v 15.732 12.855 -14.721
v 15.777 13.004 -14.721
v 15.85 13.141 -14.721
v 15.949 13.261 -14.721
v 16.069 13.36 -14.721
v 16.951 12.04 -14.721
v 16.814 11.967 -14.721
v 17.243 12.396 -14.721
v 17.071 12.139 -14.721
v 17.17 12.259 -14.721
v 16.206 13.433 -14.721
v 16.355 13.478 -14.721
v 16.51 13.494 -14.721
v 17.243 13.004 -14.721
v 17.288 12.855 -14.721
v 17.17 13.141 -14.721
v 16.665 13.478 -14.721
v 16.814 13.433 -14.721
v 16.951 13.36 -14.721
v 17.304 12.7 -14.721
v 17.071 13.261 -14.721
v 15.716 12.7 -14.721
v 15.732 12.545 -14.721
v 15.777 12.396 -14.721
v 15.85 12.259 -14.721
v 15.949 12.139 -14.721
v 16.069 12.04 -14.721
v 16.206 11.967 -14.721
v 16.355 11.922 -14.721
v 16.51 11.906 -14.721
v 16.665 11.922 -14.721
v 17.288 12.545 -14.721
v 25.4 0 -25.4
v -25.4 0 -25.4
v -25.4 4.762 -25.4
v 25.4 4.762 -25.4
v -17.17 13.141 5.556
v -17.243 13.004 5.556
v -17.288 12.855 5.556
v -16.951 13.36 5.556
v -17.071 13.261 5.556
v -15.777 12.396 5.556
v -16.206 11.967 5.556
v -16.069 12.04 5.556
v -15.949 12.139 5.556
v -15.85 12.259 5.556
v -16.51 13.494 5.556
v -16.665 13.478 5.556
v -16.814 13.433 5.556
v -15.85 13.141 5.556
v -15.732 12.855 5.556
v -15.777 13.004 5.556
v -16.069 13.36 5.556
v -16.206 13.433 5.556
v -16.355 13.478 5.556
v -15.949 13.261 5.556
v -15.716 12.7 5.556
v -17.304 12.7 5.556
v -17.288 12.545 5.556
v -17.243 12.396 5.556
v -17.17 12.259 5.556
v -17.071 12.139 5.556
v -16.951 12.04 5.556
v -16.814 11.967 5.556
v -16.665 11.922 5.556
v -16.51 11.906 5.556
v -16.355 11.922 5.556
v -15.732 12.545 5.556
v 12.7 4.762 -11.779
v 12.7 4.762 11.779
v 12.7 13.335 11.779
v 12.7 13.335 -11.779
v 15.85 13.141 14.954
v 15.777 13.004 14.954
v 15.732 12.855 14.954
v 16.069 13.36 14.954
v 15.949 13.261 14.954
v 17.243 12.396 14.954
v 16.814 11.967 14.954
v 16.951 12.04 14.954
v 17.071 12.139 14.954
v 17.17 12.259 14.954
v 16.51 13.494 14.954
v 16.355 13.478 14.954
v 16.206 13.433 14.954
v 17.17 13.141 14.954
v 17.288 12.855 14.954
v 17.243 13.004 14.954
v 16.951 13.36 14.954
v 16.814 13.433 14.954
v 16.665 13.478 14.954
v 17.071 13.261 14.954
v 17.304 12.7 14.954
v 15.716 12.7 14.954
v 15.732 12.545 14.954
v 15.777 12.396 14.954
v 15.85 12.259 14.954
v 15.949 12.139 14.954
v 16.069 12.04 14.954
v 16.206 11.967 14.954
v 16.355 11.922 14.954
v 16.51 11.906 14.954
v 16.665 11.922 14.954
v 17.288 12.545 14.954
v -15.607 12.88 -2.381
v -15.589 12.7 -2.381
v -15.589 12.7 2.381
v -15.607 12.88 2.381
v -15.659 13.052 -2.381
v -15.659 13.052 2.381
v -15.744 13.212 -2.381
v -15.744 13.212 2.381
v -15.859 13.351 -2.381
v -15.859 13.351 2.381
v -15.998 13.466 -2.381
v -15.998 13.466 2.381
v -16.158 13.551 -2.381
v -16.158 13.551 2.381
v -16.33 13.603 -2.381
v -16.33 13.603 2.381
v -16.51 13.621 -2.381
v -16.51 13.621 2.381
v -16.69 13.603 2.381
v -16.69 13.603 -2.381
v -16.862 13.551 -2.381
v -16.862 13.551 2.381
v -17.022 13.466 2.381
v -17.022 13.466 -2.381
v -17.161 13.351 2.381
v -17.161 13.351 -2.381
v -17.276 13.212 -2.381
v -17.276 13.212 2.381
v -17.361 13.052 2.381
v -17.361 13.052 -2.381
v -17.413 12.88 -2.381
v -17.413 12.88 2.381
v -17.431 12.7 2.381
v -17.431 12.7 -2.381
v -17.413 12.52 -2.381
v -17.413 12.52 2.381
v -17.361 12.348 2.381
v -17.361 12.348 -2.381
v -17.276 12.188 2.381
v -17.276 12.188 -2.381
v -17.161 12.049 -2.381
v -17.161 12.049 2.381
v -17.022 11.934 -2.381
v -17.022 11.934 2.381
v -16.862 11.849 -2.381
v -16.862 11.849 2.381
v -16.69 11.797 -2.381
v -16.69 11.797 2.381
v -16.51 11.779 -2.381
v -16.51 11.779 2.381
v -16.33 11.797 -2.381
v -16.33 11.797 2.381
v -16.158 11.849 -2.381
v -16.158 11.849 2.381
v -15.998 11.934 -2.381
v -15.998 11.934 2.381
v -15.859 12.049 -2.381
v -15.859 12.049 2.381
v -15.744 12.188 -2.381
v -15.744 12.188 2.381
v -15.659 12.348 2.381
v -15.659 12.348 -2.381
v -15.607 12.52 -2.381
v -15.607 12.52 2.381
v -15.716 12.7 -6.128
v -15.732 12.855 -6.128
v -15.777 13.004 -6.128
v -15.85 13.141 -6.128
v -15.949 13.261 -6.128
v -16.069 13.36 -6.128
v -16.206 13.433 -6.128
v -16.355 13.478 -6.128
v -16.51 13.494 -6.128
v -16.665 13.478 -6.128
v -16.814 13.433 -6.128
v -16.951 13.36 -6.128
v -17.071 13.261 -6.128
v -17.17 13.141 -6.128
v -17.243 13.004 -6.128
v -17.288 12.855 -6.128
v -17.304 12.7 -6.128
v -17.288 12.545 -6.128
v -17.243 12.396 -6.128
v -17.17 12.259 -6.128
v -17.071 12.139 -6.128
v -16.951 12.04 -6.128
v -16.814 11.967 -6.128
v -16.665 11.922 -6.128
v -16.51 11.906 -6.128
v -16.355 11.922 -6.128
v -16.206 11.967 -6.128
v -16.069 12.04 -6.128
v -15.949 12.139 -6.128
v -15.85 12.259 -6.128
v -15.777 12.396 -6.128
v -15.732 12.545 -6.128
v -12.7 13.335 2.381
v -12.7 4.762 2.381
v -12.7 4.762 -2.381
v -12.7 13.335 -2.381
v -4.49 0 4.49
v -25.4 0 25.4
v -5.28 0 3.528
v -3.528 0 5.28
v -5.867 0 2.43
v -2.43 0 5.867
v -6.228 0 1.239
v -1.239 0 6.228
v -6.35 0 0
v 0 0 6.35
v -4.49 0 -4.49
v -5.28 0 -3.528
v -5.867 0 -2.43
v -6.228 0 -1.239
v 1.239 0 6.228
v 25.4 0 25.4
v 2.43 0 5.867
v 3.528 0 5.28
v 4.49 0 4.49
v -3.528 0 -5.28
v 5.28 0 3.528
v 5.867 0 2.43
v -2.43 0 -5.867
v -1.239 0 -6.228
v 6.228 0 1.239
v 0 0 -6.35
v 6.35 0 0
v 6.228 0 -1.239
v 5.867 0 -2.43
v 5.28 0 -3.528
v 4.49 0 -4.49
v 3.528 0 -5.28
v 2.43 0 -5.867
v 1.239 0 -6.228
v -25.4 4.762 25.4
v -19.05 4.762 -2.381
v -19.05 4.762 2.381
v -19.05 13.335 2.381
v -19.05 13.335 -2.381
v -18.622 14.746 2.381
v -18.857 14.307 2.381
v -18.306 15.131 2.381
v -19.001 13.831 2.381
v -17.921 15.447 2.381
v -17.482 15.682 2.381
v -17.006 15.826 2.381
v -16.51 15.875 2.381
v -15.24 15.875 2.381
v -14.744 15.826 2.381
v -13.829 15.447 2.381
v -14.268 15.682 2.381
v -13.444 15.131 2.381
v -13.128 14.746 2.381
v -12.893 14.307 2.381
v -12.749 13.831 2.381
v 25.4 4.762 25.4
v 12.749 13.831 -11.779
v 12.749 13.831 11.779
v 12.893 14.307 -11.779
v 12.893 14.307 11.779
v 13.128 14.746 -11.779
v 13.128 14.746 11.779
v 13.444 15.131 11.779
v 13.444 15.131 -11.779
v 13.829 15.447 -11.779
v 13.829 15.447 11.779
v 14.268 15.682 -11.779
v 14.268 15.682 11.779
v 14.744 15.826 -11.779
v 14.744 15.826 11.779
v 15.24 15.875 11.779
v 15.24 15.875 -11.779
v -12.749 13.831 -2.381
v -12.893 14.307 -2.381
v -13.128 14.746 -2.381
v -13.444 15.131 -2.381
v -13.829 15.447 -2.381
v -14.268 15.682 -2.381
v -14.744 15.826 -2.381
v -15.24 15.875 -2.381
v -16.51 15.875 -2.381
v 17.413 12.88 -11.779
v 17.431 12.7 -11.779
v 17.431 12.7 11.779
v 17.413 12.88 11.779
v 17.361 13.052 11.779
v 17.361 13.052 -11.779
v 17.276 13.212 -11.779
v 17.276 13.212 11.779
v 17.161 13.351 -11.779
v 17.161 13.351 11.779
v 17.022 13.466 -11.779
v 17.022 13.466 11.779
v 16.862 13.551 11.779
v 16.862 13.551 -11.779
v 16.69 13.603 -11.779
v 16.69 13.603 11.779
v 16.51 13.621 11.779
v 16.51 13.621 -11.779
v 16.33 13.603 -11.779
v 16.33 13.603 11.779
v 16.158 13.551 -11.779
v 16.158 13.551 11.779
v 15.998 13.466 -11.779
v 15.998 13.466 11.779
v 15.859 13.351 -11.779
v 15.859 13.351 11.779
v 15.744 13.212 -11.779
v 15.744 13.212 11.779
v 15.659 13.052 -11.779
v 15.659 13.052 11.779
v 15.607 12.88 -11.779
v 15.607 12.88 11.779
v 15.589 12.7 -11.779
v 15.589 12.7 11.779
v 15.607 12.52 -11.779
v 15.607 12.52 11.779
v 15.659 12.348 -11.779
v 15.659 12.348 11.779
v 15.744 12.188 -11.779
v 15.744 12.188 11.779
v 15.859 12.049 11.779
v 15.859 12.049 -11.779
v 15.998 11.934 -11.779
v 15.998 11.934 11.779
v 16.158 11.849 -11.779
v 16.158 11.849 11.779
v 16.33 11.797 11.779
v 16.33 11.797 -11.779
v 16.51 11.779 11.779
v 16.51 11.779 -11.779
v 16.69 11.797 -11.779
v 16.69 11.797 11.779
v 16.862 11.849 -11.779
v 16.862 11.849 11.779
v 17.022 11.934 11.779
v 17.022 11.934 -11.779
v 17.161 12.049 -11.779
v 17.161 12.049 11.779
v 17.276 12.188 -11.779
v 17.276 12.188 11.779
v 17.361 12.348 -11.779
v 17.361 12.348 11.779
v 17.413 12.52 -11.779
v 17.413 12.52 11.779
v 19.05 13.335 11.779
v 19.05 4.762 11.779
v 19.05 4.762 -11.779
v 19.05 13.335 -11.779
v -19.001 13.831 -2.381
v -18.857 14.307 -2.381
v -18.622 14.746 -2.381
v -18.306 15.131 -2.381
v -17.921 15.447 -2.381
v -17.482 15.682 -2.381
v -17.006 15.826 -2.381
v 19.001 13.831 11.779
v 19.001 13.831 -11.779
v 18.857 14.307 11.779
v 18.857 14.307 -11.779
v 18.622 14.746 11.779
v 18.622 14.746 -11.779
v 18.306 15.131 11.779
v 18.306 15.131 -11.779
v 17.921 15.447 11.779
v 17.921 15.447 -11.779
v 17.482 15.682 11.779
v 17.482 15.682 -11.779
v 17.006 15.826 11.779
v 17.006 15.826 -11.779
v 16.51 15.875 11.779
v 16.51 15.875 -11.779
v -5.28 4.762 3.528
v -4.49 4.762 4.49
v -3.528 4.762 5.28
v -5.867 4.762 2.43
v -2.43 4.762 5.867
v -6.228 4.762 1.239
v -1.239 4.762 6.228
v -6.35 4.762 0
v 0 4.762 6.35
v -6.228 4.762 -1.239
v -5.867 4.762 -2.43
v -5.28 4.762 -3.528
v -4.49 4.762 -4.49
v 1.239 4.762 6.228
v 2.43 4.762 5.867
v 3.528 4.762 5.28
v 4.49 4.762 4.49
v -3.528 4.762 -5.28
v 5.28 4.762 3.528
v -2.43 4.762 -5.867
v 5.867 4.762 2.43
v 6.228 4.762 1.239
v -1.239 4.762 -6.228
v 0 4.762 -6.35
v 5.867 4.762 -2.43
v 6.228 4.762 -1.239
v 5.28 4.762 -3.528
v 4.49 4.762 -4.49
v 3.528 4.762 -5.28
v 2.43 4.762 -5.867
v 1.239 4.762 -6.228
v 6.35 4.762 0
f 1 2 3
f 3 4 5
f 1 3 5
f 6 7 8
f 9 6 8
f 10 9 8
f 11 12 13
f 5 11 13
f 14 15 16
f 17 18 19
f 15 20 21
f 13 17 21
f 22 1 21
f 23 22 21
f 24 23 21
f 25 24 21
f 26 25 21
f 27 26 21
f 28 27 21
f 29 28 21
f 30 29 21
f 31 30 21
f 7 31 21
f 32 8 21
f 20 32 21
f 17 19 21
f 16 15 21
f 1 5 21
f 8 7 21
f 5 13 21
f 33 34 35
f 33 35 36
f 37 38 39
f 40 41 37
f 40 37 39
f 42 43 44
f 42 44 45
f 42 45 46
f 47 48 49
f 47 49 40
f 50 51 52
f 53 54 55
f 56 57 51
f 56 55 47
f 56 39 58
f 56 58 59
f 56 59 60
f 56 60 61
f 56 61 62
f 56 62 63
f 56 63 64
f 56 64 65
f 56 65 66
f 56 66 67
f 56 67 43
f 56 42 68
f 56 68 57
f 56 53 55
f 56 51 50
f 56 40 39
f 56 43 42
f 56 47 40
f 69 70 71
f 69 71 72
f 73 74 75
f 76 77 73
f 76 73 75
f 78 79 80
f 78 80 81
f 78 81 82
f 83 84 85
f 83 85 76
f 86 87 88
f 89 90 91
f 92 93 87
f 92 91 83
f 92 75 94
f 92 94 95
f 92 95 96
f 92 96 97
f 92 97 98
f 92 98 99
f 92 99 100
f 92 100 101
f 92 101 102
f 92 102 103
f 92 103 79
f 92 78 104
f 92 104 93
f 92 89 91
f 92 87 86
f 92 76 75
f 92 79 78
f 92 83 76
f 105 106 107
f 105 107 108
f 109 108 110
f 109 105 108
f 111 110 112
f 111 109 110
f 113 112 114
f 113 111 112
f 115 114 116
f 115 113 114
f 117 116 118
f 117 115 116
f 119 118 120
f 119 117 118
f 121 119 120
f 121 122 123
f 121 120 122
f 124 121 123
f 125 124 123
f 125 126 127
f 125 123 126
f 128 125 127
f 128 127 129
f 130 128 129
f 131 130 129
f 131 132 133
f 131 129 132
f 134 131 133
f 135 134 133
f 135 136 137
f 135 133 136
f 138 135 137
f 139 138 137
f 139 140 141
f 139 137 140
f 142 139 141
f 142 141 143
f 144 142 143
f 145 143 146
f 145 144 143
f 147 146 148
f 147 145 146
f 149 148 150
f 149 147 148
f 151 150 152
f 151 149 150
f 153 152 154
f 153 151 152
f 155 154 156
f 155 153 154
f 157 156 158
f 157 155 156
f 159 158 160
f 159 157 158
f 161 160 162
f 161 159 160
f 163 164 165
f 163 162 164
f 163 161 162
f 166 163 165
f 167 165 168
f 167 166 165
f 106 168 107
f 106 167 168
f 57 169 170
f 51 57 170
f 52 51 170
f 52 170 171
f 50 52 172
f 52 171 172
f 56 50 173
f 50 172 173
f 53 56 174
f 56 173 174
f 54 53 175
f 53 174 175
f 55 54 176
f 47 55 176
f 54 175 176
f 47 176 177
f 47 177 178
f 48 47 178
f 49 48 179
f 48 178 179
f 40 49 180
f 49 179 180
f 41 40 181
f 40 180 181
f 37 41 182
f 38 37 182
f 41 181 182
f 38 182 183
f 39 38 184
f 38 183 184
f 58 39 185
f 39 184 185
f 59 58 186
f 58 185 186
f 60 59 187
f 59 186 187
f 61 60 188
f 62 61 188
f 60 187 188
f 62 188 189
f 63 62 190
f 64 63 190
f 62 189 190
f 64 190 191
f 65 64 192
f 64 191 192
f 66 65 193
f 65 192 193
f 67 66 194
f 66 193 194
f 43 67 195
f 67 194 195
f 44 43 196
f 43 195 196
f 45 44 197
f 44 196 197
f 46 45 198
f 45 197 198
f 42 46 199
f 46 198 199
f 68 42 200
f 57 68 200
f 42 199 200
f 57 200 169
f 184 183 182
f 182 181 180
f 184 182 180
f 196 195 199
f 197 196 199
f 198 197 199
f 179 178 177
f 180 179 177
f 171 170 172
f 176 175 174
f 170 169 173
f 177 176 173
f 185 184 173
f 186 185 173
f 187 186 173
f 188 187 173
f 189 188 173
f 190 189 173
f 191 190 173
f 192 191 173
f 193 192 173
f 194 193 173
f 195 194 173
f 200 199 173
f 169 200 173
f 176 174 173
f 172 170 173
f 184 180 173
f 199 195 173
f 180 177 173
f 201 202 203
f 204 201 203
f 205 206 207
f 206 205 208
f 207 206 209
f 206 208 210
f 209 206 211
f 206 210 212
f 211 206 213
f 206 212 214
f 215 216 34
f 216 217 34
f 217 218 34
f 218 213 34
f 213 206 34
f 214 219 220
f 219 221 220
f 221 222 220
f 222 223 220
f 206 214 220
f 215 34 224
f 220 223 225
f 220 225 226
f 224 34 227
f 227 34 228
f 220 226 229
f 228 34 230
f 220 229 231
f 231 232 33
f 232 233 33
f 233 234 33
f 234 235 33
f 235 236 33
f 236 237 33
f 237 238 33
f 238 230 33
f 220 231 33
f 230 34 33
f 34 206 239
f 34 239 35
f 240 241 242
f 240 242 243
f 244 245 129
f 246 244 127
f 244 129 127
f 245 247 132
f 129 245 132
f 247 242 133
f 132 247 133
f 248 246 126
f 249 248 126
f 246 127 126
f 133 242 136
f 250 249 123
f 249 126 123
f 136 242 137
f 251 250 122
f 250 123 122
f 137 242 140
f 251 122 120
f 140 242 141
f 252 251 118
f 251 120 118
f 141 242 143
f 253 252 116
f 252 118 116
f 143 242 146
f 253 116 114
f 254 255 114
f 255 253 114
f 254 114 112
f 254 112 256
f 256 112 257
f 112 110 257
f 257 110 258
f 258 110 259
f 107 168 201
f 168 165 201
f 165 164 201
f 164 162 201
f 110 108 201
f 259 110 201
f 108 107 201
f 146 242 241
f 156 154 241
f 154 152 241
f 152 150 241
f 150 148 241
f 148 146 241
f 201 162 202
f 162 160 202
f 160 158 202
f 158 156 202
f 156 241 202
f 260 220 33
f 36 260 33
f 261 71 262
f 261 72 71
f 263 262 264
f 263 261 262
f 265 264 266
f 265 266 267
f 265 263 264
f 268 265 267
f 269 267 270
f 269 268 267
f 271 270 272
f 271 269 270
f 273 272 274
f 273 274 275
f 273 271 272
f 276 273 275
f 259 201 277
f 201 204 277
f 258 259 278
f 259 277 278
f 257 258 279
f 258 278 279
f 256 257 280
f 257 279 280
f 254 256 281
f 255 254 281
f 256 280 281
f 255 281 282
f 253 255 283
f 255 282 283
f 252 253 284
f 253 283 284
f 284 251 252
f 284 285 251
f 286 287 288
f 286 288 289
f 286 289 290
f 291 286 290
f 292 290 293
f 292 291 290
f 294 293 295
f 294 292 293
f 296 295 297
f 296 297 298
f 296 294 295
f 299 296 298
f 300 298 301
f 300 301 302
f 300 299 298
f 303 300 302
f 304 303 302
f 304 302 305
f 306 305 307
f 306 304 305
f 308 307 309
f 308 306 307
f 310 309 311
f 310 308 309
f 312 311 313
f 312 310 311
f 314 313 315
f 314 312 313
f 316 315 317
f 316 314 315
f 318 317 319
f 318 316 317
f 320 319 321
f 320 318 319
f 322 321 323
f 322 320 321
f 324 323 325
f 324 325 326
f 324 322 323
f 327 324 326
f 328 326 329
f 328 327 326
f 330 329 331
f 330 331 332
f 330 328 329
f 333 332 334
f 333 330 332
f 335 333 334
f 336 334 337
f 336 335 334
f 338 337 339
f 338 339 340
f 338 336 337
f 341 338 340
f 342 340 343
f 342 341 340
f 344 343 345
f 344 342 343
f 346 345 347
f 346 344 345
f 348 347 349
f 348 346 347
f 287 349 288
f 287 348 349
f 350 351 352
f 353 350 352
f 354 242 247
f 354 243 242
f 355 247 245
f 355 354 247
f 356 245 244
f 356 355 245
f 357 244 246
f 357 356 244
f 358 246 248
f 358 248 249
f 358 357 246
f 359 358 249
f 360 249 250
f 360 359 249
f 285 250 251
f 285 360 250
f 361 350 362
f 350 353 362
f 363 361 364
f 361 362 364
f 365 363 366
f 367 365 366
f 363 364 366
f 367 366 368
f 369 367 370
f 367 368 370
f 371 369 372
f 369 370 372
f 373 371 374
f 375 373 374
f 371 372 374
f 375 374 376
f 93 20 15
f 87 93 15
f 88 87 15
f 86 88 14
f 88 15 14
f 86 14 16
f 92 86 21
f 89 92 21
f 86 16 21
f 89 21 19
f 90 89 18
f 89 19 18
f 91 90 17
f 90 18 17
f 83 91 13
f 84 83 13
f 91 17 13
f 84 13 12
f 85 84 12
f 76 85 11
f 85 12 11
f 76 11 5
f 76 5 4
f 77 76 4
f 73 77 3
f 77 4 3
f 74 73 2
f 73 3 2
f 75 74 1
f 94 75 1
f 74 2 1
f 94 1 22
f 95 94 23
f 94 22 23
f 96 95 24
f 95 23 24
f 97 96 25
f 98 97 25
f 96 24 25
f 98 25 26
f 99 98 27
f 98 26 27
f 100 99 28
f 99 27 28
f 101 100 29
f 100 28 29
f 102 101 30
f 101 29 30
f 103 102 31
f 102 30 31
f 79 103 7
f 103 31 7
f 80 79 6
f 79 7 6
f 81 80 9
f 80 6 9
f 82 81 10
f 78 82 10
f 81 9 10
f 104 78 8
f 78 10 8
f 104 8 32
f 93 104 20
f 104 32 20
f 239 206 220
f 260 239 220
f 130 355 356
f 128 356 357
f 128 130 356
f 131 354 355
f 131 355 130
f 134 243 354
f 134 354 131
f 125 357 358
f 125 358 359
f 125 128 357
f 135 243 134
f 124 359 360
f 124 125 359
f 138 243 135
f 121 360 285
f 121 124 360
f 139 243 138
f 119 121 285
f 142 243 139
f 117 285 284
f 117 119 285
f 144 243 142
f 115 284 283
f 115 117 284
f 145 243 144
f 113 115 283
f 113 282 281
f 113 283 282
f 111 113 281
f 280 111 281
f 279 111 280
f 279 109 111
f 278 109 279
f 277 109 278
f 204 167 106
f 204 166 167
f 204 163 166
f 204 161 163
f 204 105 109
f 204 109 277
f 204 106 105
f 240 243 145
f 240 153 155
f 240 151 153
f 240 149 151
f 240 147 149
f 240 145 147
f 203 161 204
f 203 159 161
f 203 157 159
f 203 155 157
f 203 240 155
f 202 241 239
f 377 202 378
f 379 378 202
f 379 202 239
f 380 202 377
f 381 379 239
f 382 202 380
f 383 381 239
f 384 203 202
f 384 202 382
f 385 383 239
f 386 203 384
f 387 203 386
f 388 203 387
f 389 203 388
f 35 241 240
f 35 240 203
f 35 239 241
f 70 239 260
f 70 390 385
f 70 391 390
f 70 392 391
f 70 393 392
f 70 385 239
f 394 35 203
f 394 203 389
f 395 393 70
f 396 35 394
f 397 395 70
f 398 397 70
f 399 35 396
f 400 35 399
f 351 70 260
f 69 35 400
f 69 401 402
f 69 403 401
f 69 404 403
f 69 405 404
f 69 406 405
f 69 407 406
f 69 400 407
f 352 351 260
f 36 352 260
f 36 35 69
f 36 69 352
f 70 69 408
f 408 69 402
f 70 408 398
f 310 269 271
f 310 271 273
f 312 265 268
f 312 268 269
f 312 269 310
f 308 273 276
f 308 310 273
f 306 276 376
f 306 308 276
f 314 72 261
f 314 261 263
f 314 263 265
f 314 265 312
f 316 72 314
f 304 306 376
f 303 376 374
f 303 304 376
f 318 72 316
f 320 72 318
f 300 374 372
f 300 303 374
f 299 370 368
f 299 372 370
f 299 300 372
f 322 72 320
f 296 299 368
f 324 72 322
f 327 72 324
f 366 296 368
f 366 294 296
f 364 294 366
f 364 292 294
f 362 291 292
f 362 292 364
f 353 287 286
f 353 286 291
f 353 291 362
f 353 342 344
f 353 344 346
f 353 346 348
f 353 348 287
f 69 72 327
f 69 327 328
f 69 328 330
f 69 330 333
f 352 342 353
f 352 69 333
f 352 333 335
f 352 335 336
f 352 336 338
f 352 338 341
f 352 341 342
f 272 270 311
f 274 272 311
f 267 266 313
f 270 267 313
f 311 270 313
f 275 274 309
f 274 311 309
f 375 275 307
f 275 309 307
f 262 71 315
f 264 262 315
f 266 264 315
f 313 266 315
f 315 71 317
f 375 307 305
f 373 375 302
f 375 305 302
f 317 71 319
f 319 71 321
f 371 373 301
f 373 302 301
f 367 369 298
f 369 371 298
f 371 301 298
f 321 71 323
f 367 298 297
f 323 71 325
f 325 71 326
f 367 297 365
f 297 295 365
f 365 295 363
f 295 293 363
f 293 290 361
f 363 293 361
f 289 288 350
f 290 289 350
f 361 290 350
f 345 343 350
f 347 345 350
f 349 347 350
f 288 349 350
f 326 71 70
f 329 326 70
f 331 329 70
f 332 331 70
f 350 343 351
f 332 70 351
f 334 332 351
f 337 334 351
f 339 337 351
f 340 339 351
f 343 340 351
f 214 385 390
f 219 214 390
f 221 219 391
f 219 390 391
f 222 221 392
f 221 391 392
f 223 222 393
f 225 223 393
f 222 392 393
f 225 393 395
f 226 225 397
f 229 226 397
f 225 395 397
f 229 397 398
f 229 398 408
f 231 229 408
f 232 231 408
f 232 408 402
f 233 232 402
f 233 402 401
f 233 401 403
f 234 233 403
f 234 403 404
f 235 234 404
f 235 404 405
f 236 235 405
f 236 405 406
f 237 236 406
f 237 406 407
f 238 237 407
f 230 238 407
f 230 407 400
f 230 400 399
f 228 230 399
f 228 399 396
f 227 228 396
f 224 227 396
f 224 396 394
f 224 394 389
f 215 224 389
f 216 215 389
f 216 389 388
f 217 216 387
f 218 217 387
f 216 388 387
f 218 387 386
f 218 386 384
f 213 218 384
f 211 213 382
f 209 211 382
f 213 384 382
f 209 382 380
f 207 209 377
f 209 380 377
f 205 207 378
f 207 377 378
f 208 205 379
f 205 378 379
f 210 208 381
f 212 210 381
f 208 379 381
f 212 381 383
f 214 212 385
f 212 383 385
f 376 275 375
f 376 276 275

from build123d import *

# Parameters (mm, degrees)
SKETCH3_W                = 50.8
SKETCH3_H                = 50.8
BOSS_EXTRUDE2_DEPTH      = 4.7625
SKETCH4_R                = 6.35
CUT_EXTRUDE2_DEPTH       = 37.235361268
SKETCH5_W                = 6.35
SKETCH5_H                = 4.7625
SKETCH5_H_2              = 23.5585
BOSS_EXTRUDE3_DEPTH      = 11.1125
CUT_EXTRUDE5_DEPTH       = 41.853071813
CUT_EXTRUDE5_DEPTH_BACK  = 41.853071813
SKETCH8_R                = 0.79375
SKETCH8_R_2              = 0.92075
BOSS_EXTRUDE5_DEPTH      = 3.175
BOSS_EXTRUDE5_DEPTH_BACK = 8.509
SKETCH9_R                = 0.79375
CUT_EXTRUDE6_START       = -23.5585
SKETCH10_R               = 0.92075
CUT_EXTRUDE6_DEPTH       = 23.5585
BOSS_EXTRUDE6_DEPTH      = 3.175
BOSS_EXTRUDE6_DEPTH_BACK = 26.500160894
SKETCH11_R               = 0.79375
FILLET1_R                = 2.54


with BuildPart() as part:
    # Sketch3 → Boss-Extrude2 (new body)
    with BuildSketch(Plane(origin=(0, 0, 0), x_dir=(1, 0, 0), z_dir=(0, 1, 0))):
        Rectangle(SKETCH3_W, SKETCH3_H)
    extrude(amount=BOSS_EXTRUDE2_DEPTH)

    # Sketch4 → Cut-Extrude2 (cut, through all)
    with BuildSketch(Plane(origin=(0, 4.7625, 0), x_dir=(1, 0, 0), z_dir=(0, 1, 0))):
        with Locations(Location((0, 0, 0), (0, 0, 270))):
            Circle(SKETCH4_R)
    extrude(amount=-CUT_EXTRUDE2_DEPTH, mode=Mode.SUBTRACT)

    # Sketch5 → Boss-Extrude3 (add)
    with BuildSketch(Plane(origin=(0, 4.7625, 0), x_dir=(1, 0, 0), z_dir=(0, 1, 0))):
        with Locations((-15.875, 0)):
            Rectangle(SKETCH5_W, SKETCH5_H)
        with Locations((15.875, 0)):
            Rectangle(SKETCH5_W, SKETCH5_H_2)
    extrude(amount=BOSS_EXTRUDE3_DEPTH)

    # Sketch8 → Cut-Extrude5 (cut, two sides: drawn at the far end of the back side and taken through both)
    with BuildSketch(Plane.XY.offset(2.38125).offset(-CUT_EXTRUDE5_DEPTH_BACK)):
        with Locations((16.51, 12.7)):
            Circle(SKETCH8_R)
        with Locations((-16.51, 12.7)):
            Circle(SKETCH8_R_2)
    extrude(amount=CUT_EXTRUDE5_DEPTH + CUT_EXTRUDE5_DEPTH_BACK, mode=Mode.SUBTRACT)

    # Sketch9 → Boss-Extrude5 (add, two sides: drawn at the far end of the back side and taken through both)
    with BuildSketch(Plane.XY.offset(2.38125).offset(-BOSS_EXTRUDE5_DEPTH_BACK)):
        with Locations((-16.51, 12.7)):
            Circle(SKETCH9_R)
        with Locations((16.51, 12.7)):
            Circle(SKETCH9_R)
    extrude(amount=BOSS_EXTRUDE5_DEPTH + BOSS_EXTRUDE5_DEPTH_BACK)


with BuildPart() as boss_extrude5_piece_1:
    # of the separate pieces the step leaves, piece 1, a body of its own (boss_extrude5_pieces)
    add(part.part.solids().sort_by_distance((-25.4, 0, -25.4))[0])

    # Sketch10 → Cut-Extrude6 (cut)
    with BuildSketch(Plane.XY.offset(11.77925).offset(CUT_EXTRUDE6_START)):
        with Locations((16.51, 12.7)):
            Circle(SKETCH10_R)
    extrude(amount=CUT_EXTRUDE6_DEPTH, mode=Mode.SUBTRACT)

    # Fillet1
    fillet1_edges = [boss_extrude5_piece_1.edges().sort_by_distance(p)[0] for p in [
        (-19.05, 15.875, 0),
        (-12.7, 15.875, 0),
        (19.05, 15.875, 0),
        (12.7, 15.875, 0),
    ]]
    fillet(fillet1_edges, radius=FILLET1_R)


with BuildPart() as boss_extrude5_piece_2:
    # of the separate pieces the step leaves, piece 2, a body of its own (boss_extrude5_pieces)
    add(part.part.solids().sort_by_distance((-15.71625, 12.7, 2.38125))[0])


with BuildPart() as body_3:
    # Sketch11 → Boss-Extrude6 (new, two sides: drawn at the far end of the back side and taken through both)
    with BuildSketch(Plane.XY.offset(11.77925).offset(-BOSS_EXTRUDE6_DEPTH_BACK)):
        with Locations((16.51, 12.7)):
            Circle(SKETCH11_R)
    extrude(amount=BOSS_EXTRUDE6_DEPTH + BOSS_EXTRUDE6_DEPTH_BACK)


solid = Compound([boss_extrude5_piece_1.part, boss_extrude5_piece_2.part, body_3.part])
